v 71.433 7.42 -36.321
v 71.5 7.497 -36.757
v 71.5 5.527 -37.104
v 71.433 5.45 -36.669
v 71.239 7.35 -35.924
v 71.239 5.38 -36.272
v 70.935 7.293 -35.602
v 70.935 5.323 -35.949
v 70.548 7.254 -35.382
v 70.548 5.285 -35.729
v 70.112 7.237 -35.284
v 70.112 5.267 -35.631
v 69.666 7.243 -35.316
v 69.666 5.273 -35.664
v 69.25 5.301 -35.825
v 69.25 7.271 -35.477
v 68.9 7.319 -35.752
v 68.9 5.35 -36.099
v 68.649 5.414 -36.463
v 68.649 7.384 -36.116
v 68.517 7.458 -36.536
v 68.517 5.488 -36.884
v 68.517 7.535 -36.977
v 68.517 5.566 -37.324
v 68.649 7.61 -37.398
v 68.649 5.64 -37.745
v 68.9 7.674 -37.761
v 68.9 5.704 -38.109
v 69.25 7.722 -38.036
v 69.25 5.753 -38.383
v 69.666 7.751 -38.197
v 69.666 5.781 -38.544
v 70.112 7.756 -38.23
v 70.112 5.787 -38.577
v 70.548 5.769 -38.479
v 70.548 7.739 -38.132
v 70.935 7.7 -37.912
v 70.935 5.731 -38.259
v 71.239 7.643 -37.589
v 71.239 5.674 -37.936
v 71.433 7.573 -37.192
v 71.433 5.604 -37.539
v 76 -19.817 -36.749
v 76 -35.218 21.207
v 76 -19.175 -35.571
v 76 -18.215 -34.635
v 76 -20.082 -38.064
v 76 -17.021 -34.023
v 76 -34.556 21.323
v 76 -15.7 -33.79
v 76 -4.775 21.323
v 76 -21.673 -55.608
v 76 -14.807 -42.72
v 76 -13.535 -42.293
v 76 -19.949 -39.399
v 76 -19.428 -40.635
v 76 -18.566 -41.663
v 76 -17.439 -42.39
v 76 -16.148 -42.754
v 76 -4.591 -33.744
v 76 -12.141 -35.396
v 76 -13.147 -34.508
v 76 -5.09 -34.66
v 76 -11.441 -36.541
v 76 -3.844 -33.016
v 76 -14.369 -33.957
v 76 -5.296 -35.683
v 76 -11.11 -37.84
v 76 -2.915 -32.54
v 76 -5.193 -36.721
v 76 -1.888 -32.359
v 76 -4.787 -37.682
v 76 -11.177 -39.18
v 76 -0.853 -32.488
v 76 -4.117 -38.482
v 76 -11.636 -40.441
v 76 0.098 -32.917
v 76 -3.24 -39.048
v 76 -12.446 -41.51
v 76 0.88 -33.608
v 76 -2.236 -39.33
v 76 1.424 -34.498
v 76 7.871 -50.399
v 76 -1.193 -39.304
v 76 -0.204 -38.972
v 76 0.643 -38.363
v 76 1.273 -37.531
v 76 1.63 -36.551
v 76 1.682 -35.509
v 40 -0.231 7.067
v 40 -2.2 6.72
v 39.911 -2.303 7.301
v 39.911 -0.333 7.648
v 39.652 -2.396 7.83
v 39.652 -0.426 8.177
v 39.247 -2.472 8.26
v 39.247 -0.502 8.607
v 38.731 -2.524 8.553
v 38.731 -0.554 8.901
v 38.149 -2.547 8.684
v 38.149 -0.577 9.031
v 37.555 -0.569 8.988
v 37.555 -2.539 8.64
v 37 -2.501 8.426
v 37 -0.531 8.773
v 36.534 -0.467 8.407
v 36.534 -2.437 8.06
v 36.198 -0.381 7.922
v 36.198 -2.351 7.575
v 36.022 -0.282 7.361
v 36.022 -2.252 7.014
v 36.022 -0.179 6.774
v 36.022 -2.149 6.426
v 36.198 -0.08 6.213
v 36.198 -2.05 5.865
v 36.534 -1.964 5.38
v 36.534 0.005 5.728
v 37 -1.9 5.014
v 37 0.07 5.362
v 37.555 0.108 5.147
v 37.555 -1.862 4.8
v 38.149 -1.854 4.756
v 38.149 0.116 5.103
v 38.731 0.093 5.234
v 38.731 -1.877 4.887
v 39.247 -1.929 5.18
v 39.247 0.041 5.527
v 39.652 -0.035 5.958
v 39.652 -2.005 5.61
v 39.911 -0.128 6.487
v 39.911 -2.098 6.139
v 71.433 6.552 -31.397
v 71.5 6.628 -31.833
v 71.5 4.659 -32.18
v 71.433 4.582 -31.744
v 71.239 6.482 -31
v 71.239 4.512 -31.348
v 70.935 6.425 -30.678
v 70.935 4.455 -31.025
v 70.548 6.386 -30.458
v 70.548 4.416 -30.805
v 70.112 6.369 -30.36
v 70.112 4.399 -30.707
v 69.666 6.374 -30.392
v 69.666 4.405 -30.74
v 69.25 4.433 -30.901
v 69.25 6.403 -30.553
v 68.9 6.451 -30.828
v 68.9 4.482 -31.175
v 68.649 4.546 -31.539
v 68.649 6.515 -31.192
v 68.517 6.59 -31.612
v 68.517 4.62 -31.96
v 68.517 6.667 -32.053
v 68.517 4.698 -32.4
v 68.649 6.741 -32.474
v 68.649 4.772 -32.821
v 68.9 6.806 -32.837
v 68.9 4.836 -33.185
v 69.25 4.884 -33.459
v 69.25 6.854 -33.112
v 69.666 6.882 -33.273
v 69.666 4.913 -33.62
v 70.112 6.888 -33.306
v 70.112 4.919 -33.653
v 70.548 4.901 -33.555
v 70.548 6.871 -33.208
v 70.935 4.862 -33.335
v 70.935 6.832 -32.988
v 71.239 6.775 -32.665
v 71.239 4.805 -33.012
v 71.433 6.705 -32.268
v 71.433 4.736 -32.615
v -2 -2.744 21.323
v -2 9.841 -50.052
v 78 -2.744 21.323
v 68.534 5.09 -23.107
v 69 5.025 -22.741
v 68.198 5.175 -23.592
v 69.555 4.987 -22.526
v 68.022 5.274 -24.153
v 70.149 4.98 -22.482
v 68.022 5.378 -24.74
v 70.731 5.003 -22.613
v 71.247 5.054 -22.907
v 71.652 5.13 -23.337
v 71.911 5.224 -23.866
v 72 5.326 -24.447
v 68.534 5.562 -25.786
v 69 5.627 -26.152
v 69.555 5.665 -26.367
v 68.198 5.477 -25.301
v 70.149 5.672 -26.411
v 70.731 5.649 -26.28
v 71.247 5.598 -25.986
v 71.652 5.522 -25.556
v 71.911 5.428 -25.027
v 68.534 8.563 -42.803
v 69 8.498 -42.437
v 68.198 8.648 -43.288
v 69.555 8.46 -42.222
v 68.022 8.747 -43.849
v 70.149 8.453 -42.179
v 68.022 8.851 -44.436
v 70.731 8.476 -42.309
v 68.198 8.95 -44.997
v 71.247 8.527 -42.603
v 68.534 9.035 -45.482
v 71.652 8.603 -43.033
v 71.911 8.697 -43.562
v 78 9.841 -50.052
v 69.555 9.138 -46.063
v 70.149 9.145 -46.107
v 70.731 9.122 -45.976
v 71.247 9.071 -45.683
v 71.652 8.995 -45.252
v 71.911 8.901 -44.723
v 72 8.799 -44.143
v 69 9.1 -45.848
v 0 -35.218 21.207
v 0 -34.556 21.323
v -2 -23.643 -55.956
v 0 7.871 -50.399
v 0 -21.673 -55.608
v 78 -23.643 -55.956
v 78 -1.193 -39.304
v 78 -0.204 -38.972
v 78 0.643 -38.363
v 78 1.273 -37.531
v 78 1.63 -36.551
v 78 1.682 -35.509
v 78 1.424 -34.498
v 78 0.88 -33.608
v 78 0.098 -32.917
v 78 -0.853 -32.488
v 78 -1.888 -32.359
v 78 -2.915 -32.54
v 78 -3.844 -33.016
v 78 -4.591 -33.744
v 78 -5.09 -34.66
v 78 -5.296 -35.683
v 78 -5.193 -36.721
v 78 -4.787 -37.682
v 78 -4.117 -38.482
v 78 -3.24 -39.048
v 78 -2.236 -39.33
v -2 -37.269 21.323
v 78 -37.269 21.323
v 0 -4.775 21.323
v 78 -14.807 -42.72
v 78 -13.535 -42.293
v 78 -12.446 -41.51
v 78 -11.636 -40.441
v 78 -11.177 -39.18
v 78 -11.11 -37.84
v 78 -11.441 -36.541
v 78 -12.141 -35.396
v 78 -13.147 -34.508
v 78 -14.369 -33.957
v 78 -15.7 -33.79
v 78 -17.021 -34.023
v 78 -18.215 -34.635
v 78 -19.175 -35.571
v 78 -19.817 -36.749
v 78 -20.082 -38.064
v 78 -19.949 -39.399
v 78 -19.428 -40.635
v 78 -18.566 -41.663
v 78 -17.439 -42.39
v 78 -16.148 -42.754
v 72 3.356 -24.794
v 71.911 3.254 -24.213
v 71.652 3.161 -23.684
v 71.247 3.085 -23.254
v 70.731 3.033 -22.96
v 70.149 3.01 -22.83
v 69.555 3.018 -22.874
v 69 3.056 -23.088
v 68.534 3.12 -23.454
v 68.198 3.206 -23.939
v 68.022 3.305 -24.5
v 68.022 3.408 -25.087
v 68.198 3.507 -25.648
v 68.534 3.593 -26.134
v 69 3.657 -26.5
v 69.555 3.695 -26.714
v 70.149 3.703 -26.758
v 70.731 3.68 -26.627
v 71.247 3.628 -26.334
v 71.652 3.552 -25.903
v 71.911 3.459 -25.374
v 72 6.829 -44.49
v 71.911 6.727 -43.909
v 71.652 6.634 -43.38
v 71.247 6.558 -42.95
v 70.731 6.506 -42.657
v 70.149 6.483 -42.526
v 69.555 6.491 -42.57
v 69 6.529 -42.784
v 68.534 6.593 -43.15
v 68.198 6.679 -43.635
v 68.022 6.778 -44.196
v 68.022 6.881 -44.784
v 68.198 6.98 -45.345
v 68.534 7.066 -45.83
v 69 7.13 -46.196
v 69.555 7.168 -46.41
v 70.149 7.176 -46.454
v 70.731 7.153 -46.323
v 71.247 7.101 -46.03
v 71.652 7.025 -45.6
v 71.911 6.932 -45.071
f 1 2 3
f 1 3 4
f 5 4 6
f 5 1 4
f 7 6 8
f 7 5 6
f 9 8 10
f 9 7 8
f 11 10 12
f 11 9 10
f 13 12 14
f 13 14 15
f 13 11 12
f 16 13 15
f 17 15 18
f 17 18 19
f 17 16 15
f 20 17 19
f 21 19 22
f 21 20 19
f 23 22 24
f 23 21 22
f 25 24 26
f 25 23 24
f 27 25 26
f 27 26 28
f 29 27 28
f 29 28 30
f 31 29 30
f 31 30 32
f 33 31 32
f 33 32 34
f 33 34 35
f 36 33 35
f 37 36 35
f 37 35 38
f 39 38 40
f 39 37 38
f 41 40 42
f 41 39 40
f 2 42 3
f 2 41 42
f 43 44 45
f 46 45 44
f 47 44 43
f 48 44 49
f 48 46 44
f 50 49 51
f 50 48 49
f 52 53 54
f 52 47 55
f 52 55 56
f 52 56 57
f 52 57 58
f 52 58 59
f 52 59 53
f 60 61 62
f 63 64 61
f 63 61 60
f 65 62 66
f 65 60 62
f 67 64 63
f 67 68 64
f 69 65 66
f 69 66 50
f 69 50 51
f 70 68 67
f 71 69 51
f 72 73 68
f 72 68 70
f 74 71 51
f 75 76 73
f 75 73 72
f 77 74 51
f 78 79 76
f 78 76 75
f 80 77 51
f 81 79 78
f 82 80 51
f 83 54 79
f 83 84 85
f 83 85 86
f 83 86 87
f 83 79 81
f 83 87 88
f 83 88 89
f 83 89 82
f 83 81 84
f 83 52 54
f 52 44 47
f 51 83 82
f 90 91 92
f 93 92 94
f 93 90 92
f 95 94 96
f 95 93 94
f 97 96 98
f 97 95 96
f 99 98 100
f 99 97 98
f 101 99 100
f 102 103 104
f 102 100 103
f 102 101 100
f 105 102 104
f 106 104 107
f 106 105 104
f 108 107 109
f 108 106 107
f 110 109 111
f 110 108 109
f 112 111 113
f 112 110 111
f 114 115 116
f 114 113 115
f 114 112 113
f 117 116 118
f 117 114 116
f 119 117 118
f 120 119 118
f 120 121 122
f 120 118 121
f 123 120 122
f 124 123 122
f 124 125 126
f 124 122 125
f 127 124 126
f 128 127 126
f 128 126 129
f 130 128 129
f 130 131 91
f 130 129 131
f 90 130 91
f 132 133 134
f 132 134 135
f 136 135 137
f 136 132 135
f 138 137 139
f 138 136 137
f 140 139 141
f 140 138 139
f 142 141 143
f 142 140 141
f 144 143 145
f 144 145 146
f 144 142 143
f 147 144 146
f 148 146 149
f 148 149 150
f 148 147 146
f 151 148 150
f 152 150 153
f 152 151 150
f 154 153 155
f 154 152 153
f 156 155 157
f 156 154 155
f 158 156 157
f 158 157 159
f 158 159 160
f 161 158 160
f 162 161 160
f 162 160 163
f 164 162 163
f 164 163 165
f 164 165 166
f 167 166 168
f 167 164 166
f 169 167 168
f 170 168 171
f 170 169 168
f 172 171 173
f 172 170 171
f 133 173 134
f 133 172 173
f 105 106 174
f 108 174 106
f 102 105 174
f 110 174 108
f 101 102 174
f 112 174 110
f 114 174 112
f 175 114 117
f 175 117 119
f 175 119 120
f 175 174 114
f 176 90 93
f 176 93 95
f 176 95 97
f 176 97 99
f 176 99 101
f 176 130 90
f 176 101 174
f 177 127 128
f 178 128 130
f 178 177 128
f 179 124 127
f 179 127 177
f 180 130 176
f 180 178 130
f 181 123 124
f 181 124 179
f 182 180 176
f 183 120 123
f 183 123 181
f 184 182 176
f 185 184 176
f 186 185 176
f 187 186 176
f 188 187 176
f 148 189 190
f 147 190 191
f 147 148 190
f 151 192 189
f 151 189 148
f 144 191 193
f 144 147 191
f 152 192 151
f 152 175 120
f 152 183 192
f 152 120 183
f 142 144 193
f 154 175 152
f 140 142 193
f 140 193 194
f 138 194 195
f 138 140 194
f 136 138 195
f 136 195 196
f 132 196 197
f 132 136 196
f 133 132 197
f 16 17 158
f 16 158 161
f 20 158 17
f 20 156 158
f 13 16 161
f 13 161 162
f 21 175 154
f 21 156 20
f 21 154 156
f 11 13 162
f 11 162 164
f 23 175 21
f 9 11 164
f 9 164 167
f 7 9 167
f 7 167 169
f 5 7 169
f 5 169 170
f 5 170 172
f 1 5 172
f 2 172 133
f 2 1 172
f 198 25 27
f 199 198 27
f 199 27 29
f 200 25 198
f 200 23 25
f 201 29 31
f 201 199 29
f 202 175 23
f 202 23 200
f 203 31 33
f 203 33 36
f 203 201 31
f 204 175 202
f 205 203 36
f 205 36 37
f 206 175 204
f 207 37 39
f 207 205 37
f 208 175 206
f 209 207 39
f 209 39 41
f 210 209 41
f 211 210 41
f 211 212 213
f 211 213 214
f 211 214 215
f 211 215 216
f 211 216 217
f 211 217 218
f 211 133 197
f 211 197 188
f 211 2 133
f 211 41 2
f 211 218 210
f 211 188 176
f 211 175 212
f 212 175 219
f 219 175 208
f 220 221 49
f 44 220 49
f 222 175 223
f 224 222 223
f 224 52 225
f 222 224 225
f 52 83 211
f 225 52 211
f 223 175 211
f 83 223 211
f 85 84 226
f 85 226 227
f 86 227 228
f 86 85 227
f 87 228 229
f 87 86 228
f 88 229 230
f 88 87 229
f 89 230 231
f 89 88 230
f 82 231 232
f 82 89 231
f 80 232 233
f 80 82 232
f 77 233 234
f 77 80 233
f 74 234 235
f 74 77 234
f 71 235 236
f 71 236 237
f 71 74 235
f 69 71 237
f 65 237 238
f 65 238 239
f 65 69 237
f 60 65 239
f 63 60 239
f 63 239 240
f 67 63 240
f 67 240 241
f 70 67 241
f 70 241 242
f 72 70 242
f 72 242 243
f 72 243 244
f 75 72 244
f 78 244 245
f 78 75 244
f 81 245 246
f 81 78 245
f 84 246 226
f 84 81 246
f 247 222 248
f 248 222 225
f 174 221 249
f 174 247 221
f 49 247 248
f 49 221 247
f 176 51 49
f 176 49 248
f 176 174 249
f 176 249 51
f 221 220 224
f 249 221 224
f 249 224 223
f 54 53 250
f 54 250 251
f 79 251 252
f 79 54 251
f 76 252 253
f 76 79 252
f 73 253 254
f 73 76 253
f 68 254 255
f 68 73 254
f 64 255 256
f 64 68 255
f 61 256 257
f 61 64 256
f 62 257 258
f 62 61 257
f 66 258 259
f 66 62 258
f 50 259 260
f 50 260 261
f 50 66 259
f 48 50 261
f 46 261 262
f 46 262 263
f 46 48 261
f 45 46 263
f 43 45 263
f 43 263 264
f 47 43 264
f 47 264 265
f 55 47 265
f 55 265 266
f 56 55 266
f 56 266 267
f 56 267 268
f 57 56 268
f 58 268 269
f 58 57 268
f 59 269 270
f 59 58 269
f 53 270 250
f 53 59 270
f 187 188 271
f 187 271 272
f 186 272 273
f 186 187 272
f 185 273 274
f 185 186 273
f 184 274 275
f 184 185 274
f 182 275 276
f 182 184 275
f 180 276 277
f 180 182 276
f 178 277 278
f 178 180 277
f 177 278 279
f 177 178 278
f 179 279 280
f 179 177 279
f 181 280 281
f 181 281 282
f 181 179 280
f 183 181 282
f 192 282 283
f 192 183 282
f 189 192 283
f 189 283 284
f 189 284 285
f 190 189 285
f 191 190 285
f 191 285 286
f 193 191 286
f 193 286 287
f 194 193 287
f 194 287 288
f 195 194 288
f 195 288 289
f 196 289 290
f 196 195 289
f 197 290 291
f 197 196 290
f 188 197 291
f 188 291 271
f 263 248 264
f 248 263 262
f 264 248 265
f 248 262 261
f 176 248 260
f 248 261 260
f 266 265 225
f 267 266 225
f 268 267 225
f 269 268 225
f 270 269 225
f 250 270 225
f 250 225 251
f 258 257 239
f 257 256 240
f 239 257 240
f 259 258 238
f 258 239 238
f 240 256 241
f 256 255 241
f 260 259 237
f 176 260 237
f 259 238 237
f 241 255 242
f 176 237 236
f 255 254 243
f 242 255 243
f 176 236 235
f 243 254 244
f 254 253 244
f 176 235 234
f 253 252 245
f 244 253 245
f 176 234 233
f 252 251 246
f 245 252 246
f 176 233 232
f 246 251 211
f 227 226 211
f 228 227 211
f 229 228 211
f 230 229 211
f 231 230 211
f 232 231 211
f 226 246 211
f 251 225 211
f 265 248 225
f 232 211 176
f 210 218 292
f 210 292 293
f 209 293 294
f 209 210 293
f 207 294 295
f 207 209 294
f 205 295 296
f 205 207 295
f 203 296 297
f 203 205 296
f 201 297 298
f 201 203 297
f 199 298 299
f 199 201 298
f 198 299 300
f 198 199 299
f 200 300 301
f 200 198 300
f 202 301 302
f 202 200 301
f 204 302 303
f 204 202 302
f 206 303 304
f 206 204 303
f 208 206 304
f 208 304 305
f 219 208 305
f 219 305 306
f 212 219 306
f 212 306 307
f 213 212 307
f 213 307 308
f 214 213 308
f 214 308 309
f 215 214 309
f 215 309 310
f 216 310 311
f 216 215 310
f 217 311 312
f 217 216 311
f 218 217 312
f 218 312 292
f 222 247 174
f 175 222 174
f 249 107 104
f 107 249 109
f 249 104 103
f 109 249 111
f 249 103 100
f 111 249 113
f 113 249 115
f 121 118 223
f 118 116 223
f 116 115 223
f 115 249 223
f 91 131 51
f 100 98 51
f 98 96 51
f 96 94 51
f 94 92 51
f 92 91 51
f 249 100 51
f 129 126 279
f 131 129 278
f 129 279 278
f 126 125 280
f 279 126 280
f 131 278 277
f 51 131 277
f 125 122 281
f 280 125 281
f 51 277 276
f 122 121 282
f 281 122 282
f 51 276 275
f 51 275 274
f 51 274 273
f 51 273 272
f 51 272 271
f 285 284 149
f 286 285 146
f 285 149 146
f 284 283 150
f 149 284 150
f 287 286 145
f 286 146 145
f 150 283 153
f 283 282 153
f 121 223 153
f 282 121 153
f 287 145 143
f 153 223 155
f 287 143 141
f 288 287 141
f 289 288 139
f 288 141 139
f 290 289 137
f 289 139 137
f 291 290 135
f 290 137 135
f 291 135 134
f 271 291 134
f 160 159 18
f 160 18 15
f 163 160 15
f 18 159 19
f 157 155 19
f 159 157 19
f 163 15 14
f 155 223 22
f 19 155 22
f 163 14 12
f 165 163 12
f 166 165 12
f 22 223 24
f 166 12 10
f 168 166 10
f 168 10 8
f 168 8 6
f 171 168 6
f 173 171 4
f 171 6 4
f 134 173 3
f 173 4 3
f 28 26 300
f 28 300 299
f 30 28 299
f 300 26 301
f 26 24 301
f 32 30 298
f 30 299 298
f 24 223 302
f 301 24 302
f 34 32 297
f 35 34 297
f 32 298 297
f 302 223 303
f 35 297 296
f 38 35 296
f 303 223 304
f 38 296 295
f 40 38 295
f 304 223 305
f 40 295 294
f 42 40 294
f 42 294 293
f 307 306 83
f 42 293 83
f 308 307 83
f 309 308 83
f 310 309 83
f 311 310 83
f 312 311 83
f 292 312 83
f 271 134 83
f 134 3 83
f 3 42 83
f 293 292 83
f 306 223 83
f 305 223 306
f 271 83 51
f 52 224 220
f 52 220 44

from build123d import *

# Parameters (mm, degrees)
CYLINDER007_R          = 11
CYLINDER007_DEPTH      = 2
CYLINDER012_R          = 2.5
CYLINDER012_DEPTH      = 2
CYLINDER013_R          = 2
CYLINDER013_DEPTH      = 2
CYLINDER014_R          = 3.5
CYLINDER014_DEPTH      = 2
CYLINDER015_R          = 4.5
CYLINDER015_DEPTH      = 2
BOX019_W               = 80
BOX019_H               = 38
BOX019_DEPTH           = 8
BOX019_PLACEMENT_ANGLE = 10
CYLINDER024_R          = 2
CYLINDER024_DEPTH      = 3
CYLINDER025_R          = 2
CYLINDER025_DEPTH      = 2
CYLINDER026_R          = 1.5
CYLINDER026_DEPTH      = 2
CYLINDER027_R          = 1.5
CYLINDER027_DEPTH      = 2
BOX004_W               = 76
BOX004_H               = 30
BOX004_DEPTH           = 78
BOX003_W               = 80
BOX003_H               = 34
BOX003_DEPTH           = 80
CUT012_PLACEMENT_ANGLE = 10


with BuildPart() as basehole:
    # Cylinder007 → Cylinder007 (new body)
    with BuildSketch(Plane(origin=(15, -19, 20), x_dir=(1, 0, 0), z_dir=(0, 0, 1))):
        Circle(CYLINDER007_R)
    extrude(amount=CYLINDER007_DEPTH)


with BuildPart() as volumehole:
    # Cylinder012 → Cylinder012 (new body)
    with BuildSketch(Plane(origin=(62, -20, 20), x_dir=(1, 0, 0), z_dir=(0, 0, 1))):
        Circle(CYLINDER012_R)
    extrude(amount=CYLINDER012_DEPTH)


with BuildPart() as extspeakerhole:
    # Cylinder013 → Cylinder013 (new body)
    with BuildSketch(Plane(origin=(70, 1, -45), x_dir=(1, 0, 0), z_dir=(0, -1, 0))):
        Circle(CYLINDER013_R)
    extrude(amount=CYLINDER013_DEPTH)


with BuildPart() as audioinhole:
    # Cylinder014 → Cylinder014 (new body)
    with BuildSketch(Plane(origin=(76, -8, -35), x_dir=(0, 0, -1), z_dir=(1, 0, 0))):
        Circle(CYLINDER014_R)
    extrude(amount=CYLINDER014_DEPTH)


with BuildPart() as powerinhole:
    # Cylinder015 → Cylinder015 (new body)
    with BuildSketch(Plane(origin=(76, -22, -35), x_dir=(0, 0, -1), z_dir=(1, 0, 0))):
        Circle(CYLINDER015_R)
    extrude(amount=CYLINDER015_DEPTH)


with BuildPart() as frontlevel:
    # Box019 → Box019 (new body)
    with BuildSketch(Plane.XY):
        with Locations((40, 19)):
            Rectangle(BOX019_W, BOX019_H)
    extrude(amount=BOX019_DEPTH)


with BuildPart() as frontlevel_1:
    # Box019 placement: moved
    add(frontlevel.part.moved(Location((-2, -36, 28))).rotate(Axis((-2, -36, 28), (-1, 0, 0)), BOX019_PLACEMENT_ANGLE))


with BuildPart() as wirehole002:
    # Cylinder024 → Cylinder024 (new body)
    with BuildSketch(Plane(origin=(38, 1, 7), x_dir=(1, 0, 0), z_dir=(0, -1, 0))):
        Circle(CYLINDER024_R)
    extrude(amount=CYLINDER024_DEPTH)


with BuildPart() as extspeakerhole001:
    # Cylinder025 → Cylinder025 (new body)
    with BuildSketch(Plane(origin=(70, 1, -25), x_dir=(1, 0, 0), z_dir=(0, -1, 0))):
        Circle(CYLINDER025_R)
    extrude(amount=CYLINDER025_DEPTH)


with BuildPart() as extspeakerhole002:
    # Cylinder026 → Cylinder026 (new body)
    with BuildSketch(Plane(origin=(70, 1, -32.5), x_dir=(1, 0, 0), z_dir=(0, -1, 0))):
        Circle(CYLINDER026_R)
    extrude(amount=CYLINDER026_DEPTH)


with BuildPart() as extspeakerhole003:
    # Cylinder027 → Cylinder027 (new body)
    with BuildSketch(Plane(origin=(70, 1, -37.5), x_dir=(1, 0, 0), z_dir=(0, -1, 0))):
        Circle(CYLINDER027_R)
    extrude(amount=CYLINDER027_DEPTH)


with BuildPart() as basepunch:
    # Box004 → Box004 (new body)
    with BuildSketch(Plane(origin=(0, -31, -51), x_dir=(1, 0, 0), z_dir=(0, 0, 1))):
        with Locations((38, 15)):
            Rectangle(BOX004_W, BOX004_H)
    extrude(amount=BOX004_DEPTH)

    # Fusion008: union BaseHole, VolumeHole, ExtSpeakerHole, AudioInHole, PowerInHole, FrontLevel, WireHole002, ExtSpeakerHole001, ExtSpeakerHole002, ExtSpeakerHole003
    add(basehole.part)
    add(volumehole.part)
    add(extspeakerhole.part)
    add(audioinhole.part)
    add(powerinhole.part)
    add(frontlevel_1.part)
    add(wirehole002.part)
    add(extspeakerhole001.part)
    add(extspeakerhole002.part)
    add(extspeakerhole003.part)


with BuildPart() as base:
    # Box003 → Box003 (new body)
    with BuildSketch(Plane(origin=(-2, -33, -51), x_dir=(1, 0, 0), z_dir=(0, 0, 1))):
        with Locations((40, 17)):
            Rectangle(BOX003_W, BOX003_H)
    extrude(amount=BOX003_DEPTH)

    # Cut012: cut BASEPUNCH
    add(basepunch.part, mode=Mode.SUBTRACT)


with BuildPart() as base_1:
    # Cut012 placement: moved
    add(base.part.rotate(Axis((0, 0, 0), (1, 0, 0)), CUT012_PLACEMENT_ANGLE))


solid = base_1.part
